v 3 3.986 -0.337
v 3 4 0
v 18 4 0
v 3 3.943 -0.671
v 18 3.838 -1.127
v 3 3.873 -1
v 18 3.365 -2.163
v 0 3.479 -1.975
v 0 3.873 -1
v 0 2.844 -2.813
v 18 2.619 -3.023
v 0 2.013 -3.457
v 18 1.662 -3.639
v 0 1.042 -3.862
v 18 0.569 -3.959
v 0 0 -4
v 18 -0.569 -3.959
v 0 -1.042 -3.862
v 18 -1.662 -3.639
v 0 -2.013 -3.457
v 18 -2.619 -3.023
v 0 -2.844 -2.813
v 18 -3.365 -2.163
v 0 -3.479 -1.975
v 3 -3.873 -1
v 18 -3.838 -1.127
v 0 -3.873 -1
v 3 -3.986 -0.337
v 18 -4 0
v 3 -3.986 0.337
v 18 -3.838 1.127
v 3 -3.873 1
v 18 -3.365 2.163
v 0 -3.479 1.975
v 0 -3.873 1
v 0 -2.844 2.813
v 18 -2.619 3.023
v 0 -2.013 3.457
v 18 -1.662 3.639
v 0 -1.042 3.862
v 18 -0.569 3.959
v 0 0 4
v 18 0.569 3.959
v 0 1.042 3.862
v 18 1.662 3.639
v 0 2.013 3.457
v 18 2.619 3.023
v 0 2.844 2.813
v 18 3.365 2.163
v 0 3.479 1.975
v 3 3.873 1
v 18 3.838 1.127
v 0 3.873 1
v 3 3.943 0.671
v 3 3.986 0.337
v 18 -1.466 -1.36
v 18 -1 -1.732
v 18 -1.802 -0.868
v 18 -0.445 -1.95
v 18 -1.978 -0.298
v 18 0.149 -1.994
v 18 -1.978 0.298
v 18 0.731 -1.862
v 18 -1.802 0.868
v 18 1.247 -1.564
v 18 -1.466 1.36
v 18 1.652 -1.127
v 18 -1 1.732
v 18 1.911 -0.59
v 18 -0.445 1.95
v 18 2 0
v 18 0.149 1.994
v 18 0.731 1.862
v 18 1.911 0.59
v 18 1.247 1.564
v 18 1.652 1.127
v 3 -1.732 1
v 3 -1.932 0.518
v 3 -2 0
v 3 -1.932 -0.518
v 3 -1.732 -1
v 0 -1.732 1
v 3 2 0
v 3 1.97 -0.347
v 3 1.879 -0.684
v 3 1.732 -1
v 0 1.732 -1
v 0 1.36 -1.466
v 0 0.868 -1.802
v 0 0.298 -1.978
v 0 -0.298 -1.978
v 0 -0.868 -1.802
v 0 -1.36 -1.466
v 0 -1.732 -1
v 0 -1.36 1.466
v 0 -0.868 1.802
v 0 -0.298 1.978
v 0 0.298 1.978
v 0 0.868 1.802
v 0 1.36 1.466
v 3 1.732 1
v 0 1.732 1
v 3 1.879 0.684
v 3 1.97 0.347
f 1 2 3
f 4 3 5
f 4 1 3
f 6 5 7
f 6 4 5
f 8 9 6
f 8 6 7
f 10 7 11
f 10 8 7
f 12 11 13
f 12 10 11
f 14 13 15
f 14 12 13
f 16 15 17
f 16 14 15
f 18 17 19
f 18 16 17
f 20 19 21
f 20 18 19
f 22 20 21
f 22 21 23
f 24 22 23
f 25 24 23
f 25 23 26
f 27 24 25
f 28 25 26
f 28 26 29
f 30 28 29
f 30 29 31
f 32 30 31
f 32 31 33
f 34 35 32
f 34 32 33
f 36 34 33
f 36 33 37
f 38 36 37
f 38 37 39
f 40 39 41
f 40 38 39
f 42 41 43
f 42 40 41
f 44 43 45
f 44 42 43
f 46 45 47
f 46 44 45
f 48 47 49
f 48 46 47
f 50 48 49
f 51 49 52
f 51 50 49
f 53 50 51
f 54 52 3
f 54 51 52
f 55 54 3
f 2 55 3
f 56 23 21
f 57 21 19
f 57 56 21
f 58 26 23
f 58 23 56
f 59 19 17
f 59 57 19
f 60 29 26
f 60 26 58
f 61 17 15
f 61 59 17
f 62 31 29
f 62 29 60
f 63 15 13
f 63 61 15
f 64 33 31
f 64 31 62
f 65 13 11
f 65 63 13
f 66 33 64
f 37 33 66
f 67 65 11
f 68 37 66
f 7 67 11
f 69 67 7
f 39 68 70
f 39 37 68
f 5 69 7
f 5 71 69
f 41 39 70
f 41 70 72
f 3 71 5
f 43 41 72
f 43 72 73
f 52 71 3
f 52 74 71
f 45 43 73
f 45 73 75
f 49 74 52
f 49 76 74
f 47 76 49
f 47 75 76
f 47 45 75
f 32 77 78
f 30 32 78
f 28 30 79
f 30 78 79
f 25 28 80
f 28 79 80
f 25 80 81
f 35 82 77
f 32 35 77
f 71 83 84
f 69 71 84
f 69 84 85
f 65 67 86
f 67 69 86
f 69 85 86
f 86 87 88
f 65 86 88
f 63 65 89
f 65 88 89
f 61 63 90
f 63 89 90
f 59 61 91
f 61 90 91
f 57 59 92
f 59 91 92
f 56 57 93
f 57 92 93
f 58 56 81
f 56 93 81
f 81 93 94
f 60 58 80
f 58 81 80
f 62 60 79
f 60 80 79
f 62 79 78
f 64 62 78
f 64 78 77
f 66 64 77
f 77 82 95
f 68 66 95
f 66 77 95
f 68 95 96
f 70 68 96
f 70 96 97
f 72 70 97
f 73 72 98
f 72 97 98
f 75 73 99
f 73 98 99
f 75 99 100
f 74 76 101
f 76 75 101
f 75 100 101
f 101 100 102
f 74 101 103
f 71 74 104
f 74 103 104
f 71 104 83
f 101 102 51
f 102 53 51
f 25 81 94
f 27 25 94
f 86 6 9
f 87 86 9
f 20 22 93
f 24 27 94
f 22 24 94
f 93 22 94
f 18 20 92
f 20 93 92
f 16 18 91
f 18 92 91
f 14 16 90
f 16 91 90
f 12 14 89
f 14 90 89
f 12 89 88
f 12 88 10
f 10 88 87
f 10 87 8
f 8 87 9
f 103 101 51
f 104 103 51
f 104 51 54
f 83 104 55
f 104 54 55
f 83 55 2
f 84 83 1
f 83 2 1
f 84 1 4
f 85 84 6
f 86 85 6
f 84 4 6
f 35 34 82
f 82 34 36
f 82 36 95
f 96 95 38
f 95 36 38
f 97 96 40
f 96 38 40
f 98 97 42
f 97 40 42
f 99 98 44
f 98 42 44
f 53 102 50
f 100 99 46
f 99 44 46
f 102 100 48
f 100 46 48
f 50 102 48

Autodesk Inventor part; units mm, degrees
ref_plane "YZ Plane" through (0, 0, 0) normal (1, 0, 0) x (0, 1, 0)
ref_plane "XY Plane" through (0, 0, 0) normal (0, 0, 1) x (1, 0, 0)
sketch "Sketch1" plane through (0, 0, 0) normal (1, 0, 0) x (0, 1, 0)
  circle A0 centre (0, 0) radius 4
  circle A1 centre (0, 0) radius 2
  dimension "d0" = 8
  dimension "d1" = 4
extrude "Extrusion1" add sketch "Sketch1" along normal blind 18
ref_plane "Work Plane1" through (0, 4, 0) normal (0, 1, 0) x (-1, 0, 0)
sketch "Sketch2" plane through (0, 4, 0) normal (0, 1, 0) x (-1, 0, 0)
  line L0 (-18, 4) -> (-18, -4) projected
  line L1 (0, 4) -> (0, -4) projected
  line L2 (1, 1) -> (-3, 1)
  line L3 (-3, 1) -> (-3, -1)
  line L4 (-3, -1) -> (1, -1)
  line L5 (1, -1) -> (1, 1)
  point P0 (0, 0)
  point P1 (-1, -1)
  point P2 (0, 0)
  dimension "d4" = 1
  dimension "d5" = 1
  dimension "d6" = 3
extrude "Extrusion2" cut sketch "Sketch2" against normal through all
thread "Thread1" size "M8x1.25" class "6g" standard "ANSI Metric M Profile" full length
properties part number "HUDSON-1-89B"
